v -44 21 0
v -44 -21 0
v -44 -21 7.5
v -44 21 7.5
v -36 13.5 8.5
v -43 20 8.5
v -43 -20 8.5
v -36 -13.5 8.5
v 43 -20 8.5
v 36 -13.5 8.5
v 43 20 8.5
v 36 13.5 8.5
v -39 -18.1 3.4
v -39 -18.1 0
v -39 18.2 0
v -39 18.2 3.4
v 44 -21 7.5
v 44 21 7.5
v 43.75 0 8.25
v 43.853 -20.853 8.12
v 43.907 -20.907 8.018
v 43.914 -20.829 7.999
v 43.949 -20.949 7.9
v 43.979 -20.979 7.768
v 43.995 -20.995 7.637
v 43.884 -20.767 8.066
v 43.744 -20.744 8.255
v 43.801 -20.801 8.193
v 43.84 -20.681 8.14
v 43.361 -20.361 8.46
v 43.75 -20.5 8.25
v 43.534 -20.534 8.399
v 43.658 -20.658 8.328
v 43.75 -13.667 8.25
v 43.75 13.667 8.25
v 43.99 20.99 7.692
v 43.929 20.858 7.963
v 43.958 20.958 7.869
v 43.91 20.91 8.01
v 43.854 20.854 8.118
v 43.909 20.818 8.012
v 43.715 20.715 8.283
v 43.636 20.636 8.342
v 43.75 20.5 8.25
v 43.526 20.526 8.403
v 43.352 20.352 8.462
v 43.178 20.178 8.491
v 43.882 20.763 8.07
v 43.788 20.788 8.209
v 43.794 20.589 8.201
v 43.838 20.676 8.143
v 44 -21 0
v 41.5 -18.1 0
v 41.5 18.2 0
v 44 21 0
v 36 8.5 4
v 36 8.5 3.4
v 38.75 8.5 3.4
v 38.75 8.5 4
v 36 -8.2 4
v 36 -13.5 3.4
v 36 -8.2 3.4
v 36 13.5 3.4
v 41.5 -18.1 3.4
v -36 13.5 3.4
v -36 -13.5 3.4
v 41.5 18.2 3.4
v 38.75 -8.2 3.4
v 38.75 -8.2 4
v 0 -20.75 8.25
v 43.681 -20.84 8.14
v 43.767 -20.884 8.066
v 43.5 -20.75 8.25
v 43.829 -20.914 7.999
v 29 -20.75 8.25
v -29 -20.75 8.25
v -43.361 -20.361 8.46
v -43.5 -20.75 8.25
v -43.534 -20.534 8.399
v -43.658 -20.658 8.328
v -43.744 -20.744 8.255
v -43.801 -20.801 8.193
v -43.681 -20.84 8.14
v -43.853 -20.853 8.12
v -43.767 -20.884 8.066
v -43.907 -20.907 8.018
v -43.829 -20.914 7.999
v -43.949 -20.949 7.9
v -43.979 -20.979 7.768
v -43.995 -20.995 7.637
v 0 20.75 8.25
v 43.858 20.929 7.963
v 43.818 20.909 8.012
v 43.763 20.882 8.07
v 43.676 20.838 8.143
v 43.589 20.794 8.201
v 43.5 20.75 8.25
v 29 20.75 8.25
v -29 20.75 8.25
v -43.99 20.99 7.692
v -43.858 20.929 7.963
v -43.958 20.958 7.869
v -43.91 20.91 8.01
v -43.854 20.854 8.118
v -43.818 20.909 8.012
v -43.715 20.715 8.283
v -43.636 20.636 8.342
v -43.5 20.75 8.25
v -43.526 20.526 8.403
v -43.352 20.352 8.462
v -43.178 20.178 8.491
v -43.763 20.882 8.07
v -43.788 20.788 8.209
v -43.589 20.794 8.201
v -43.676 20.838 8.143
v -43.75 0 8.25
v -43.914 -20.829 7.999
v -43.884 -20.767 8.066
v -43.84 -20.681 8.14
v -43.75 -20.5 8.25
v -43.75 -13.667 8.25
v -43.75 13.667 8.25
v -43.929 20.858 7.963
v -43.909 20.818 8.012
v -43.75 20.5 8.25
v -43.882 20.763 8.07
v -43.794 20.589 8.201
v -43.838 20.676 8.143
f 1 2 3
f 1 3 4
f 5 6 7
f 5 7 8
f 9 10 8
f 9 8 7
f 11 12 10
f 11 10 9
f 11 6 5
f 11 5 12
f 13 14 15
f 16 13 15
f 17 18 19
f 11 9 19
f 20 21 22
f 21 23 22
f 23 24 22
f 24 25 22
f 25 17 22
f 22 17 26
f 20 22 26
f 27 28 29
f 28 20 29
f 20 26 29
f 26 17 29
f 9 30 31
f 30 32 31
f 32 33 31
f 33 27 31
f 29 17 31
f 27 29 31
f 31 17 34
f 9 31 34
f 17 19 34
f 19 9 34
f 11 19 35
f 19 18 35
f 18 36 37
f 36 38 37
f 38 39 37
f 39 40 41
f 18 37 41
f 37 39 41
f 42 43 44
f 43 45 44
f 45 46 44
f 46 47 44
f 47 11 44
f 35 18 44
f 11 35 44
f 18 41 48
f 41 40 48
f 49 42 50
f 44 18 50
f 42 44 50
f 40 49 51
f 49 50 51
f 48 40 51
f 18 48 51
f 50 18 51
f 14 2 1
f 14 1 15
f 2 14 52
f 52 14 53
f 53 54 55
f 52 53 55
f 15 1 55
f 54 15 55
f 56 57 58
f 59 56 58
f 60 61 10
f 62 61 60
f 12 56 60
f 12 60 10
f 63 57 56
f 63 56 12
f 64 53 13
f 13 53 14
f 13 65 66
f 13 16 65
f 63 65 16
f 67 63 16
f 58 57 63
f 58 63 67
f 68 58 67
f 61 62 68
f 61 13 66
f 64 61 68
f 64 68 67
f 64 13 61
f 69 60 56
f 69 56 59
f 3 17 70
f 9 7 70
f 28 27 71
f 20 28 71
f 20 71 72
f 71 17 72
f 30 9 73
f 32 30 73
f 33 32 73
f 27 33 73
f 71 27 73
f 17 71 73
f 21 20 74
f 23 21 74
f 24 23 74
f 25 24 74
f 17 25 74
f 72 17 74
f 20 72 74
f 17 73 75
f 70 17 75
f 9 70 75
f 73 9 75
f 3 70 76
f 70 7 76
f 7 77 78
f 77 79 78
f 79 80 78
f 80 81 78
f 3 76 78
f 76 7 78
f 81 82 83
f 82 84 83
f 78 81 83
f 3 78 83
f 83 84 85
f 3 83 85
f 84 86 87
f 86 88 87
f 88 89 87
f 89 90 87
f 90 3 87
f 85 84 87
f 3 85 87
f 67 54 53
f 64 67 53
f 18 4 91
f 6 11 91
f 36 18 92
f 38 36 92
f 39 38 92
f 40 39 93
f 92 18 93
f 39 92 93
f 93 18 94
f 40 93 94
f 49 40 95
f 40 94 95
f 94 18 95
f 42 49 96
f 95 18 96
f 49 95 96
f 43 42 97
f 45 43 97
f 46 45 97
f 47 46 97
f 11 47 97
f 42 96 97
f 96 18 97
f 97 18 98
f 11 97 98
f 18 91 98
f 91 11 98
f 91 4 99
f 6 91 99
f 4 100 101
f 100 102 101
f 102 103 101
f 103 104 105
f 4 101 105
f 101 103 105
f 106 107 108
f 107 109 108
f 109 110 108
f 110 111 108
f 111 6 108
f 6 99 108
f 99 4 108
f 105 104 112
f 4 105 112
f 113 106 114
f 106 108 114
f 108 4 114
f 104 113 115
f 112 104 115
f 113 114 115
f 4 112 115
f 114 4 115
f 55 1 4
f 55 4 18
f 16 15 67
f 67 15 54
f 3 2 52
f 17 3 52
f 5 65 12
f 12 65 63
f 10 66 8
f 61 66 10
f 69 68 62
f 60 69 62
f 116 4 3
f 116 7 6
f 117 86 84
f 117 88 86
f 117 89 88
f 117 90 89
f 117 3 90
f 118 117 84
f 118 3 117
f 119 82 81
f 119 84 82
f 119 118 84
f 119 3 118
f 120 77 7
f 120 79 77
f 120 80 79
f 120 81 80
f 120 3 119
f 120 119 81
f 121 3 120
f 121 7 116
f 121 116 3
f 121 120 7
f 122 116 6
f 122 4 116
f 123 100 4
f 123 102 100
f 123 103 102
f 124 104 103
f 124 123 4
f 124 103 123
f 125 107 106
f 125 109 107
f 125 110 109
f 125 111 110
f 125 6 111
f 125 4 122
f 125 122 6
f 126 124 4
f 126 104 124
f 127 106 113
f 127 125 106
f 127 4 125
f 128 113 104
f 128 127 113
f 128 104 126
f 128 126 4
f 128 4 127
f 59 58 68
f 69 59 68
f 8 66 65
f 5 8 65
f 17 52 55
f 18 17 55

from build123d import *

# Parameters (mm, degrees)
F0_W        = 88
F0_H        = 42
F0_W_2      = 72
F0_H_2      = 27
F1_DEPTH    = 8.5
F3_DEPTH    = 4
F2_W        = 2.75
F2_H        = 5.9
F4_DEPTH    = 3.4
F5_T1_DEPTH = 93
F5_T3_DEPTH = 47


# Not quite as in the source:
# - a fillet or chamfer that OpenCascade refuses, or shapes differently, is made with other operations: its cross-section is extruded or revolved along the edge and cut away or added


with BuildPart() as f1:
    # F0 (on Top) → F1 (new body)
    with BuildSketch(Plane.XY):
        Rectangle(F0_W, F0_H)
        Rectangle(F0_W_2, F0_H_2, mode=Mode.SUBTRACT)
    extrude(amount=F1_DEPTH)

    # F2 (on face) → F3 (cut)
    with BuildSketch(Plane(origin=(0, 0, 0), x_dir=(1, 0, 0), z_dir=(0, 0, -1))):
        Polygon((38.75, 8.2), (36, 8.2), (36, -8.5), (38.75, -8.5), (38.75, -2.8), (38.75, 3.1), align=None)
    extrude(amount=-F3_DEPTH, mode=Mode.SUBTRACT)

    # F2 (on face) → F4 (cut)
    with BuildSketch(Plane(origin=(0, 0, 0), x_dir=(1, 0, 0), z_dir=(0, 0, -1))):
        Polygon((36, -8.5), (36, 8.2), (38.75, 8.2), (38.75, 3.1), (41.5, 3.1), (41.5, 18.1), (-39, 18.1), (-39, -18.2), (41.5, -18.2), (41.5, -2.8), (38.75, -2.8), (38.75, -8.5), align=None)
        with Locations((40.125, 0.15)):
            Rectangle(F2_W, F2_H)
    extrude(amount=-F4_DEPTH, mode=Mode.SUBTRACT)

    # F5: fillet of radius 1 on 4 edges, made by hand

    # F5_s2 → F5_t1 (cut)
    with BuildSketch(Plane.YZ.offset(-46.5)):
        with BuildLine():
            add(Edge.make_bspline(
                [(-20, 8.5), (-21, 8.5), (-21, 7.5)],
                knots=[0, 0, 0, 1, 1, 1], degree=2, weights=[1, 1, 1]))
            Line((-21, 7.5), (-21, 8.5))
            Line((-21, 8.5), (-20, 8.5))
        make_face()
        with BuildLine():
            add(Edge.make_bspline(
                [(21, 7.5), (21, 8.5), (20, 8.5)],
                knots=[0, 0, 0, 1, 1, 1], degree=2, weights=[1, 1, 1]))
            Line((20, 8.5), (21, 8.5))
            Line((21, 8.5), (21, 7.5))
        make_face()
    extrude(amount=F5_T1_DEPTH, mode=Mode.SUBTRACT)

    # F5_s4 → F5_t3 (cut)
    with BuildSketch(Plane.XZ.offset(-23.5)):
        with BuildLine():
            add(Edge.make_bspline(
                [(44, 7.5), (44, 8.5), (43, 8.5)],
                knots=[0, 0, 0, 1, 1, 1], degree=2, weights=[1, 1, 1]))
            Line((43, 8.5), (44, 8.5))
            Line((44, 8.5), (44, 7.5))
        make_face()
        with BuildLine():
            add(Edge.make_bspline(
                [(-44, 7.5), (-44, 8.5), (-43, 8.5)],
                knots=[0, 0, 0, 1, 1, 1], degree=2, weights=[1, 1, 1]))
            Line((-43, 8.5), (-44, 8.5))
            Line((-44, 8.5), (-44, 7.5))
        make_face()
    extrude(amount=F5_T3_DEPTH, mode=Mode.SUBTRACT)


solid = f1.part
